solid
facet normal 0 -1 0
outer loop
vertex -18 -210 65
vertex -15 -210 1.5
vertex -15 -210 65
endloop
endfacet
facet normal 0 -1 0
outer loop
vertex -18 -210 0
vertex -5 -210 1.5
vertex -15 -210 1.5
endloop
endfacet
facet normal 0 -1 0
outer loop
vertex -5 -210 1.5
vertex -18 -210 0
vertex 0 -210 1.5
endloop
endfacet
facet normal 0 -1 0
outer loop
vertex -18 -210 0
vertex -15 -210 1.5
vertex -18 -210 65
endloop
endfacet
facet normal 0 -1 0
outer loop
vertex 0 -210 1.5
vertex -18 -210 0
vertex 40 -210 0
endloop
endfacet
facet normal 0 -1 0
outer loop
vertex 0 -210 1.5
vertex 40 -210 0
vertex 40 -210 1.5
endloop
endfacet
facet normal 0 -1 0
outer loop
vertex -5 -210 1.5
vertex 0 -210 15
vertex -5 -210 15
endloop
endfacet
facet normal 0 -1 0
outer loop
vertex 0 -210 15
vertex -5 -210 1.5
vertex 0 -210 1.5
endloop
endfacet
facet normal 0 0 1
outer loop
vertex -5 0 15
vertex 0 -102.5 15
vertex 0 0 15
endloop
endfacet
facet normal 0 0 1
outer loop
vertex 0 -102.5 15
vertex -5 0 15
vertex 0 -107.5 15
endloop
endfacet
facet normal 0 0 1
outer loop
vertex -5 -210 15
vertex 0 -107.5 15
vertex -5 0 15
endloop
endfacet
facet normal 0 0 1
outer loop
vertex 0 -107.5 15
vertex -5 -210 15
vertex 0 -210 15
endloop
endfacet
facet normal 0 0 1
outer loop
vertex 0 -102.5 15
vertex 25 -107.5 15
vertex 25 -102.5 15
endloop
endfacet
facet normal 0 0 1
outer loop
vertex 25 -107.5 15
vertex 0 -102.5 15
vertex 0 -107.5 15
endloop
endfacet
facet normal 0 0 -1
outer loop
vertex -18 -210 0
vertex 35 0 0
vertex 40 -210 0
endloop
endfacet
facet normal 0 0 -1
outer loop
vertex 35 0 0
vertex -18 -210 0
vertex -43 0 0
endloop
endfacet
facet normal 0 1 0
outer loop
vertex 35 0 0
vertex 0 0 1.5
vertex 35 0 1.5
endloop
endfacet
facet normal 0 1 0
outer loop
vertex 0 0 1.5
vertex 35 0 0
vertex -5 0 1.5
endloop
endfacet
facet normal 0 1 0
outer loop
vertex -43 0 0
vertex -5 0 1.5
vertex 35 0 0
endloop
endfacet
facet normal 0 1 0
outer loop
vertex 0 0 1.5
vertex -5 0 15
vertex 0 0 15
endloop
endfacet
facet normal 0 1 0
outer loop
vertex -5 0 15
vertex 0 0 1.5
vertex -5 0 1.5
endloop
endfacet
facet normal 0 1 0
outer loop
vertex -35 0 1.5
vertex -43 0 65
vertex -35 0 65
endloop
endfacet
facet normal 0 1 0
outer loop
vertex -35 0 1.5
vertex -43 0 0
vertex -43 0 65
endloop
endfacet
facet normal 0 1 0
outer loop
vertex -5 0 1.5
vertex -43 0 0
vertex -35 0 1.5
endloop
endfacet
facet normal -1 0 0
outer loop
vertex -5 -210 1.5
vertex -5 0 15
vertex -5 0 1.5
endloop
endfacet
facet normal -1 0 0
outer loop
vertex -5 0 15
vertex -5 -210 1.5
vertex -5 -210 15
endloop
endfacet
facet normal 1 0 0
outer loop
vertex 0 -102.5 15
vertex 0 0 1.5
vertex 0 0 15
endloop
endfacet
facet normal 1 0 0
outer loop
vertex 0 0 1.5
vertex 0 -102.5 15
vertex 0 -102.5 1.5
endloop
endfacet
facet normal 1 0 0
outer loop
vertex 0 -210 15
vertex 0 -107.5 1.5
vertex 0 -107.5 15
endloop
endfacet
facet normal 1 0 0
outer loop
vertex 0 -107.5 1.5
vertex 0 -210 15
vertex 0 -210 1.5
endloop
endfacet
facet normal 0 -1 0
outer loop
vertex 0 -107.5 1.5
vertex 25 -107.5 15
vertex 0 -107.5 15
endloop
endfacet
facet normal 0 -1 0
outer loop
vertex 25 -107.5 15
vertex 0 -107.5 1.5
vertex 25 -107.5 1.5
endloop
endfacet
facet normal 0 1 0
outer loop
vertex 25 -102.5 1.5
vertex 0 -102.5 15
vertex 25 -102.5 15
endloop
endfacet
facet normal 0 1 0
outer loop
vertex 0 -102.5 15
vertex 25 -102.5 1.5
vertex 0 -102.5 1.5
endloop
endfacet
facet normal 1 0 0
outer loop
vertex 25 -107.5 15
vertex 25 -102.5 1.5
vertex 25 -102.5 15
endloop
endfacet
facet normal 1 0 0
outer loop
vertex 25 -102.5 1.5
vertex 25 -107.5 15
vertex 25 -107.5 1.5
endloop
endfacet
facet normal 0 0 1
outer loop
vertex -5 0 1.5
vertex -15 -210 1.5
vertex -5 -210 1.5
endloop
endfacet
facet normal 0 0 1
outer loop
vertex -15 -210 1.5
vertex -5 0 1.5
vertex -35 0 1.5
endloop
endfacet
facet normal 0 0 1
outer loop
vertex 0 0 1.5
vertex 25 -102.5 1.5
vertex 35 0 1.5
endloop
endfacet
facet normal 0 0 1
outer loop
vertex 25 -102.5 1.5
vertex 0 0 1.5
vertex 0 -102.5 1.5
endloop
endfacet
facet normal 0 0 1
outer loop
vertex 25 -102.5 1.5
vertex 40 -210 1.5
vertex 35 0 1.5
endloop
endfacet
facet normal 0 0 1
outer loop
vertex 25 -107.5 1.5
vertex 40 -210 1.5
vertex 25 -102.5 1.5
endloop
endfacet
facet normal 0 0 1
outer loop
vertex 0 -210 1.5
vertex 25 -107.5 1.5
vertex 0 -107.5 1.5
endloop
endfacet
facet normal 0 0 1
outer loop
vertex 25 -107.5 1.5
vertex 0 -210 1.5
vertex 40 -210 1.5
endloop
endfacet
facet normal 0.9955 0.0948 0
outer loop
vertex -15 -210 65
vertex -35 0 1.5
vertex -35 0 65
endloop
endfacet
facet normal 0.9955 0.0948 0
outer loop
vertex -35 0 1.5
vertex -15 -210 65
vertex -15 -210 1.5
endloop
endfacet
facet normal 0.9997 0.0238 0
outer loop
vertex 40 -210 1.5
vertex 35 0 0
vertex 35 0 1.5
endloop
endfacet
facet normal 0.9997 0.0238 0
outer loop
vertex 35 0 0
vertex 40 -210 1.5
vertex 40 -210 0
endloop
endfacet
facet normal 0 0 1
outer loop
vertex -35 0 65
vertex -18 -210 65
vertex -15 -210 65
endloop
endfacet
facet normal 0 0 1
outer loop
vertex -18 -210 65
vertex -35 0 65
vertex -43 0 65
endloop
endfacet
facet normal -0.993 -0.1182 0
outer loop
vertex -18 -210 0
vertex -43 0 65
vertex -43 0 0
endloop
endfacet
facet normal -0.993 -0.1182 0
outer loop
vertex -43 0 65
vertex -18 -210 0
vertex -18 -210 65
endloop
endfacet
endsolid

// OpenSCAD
// file: leftWall.scad
sh=15;      // support height
l =210;     // construction length
ft=1.5;     // floor thickness
wt=3;       // wall thickness
wh=65;      // wall height

module leftWallImpl()
{
  // internal support
  cube([l, 5, sh]);
  translate([(l-5)/2, -25, 0])
    cube([5, 25, sh]);
  // ground floor
  polyhedron(
    points = [
               [0, 30+5,  0],   // 0
               [l, 10+5,  0],   // 1
               [l,  -40,  0],   // 2
               [0,  -35,  0],   // 3
               [0, 30+5, ft],   // 4
               [l, 10+5, ft],   // 5
               [l,  -40, ft],   // 6
               [0,  -35, ft],   // 7
             ],
    faces = [
              // bottom surface:
              [0, 2, 1],
              [0, 3, 2],
              // top surface:
              [4, 5, 6],
              [4, 6, 7],
              // left wall:
              [0,7,3],
              [0,4,7],
              // right wall:
              [1,2,6],
              [1,6,5],
              // top wall:
              [0,1,5],
              [0,5,4],
              // bottom wall:
              [3,6,2],
              [3,7,6],
            ]
  );
  // main wall
  polyhedron(
    points = [
               [0, 30+5,     0],   // 0
               [l, 10+5,     0],   // 1
               [l, 10+5+wt,  0],   // 2
               [0, 35+5+wt,  0],   // 3
               [0, 30+5,    wh],   // 4
               [l, 10+5,    wh],   // 5
               [l, 10+5+wt, wh],   // 6
               [0, 35+5+wt, wh],   // 7
             ],
    faces = [
              // bottom surface:
              [0, 2, 1],
              [0, 3, 2],
              // top surface:
              [4, 5, 6],
              [4, 6, 7],
              // left wall:
              [0,7,3],
              [0,4,7],
              // right wall:
              [1,2,6],
              [1,6,5],
              // top wall:
              [0,1,5],
              [0,5,4],
              // bottom wall:
              [3,6,2],
              [3,7,6],
            ]
  );
}

module leftWall()
{
  rotate([0,0,90])
    leftWallImpl();
}

leftWall();
// main file
use <leftWall.scad>

module rightWall()
{
  mirror([0,1,0])
    leftWall();
}

rightWall();
